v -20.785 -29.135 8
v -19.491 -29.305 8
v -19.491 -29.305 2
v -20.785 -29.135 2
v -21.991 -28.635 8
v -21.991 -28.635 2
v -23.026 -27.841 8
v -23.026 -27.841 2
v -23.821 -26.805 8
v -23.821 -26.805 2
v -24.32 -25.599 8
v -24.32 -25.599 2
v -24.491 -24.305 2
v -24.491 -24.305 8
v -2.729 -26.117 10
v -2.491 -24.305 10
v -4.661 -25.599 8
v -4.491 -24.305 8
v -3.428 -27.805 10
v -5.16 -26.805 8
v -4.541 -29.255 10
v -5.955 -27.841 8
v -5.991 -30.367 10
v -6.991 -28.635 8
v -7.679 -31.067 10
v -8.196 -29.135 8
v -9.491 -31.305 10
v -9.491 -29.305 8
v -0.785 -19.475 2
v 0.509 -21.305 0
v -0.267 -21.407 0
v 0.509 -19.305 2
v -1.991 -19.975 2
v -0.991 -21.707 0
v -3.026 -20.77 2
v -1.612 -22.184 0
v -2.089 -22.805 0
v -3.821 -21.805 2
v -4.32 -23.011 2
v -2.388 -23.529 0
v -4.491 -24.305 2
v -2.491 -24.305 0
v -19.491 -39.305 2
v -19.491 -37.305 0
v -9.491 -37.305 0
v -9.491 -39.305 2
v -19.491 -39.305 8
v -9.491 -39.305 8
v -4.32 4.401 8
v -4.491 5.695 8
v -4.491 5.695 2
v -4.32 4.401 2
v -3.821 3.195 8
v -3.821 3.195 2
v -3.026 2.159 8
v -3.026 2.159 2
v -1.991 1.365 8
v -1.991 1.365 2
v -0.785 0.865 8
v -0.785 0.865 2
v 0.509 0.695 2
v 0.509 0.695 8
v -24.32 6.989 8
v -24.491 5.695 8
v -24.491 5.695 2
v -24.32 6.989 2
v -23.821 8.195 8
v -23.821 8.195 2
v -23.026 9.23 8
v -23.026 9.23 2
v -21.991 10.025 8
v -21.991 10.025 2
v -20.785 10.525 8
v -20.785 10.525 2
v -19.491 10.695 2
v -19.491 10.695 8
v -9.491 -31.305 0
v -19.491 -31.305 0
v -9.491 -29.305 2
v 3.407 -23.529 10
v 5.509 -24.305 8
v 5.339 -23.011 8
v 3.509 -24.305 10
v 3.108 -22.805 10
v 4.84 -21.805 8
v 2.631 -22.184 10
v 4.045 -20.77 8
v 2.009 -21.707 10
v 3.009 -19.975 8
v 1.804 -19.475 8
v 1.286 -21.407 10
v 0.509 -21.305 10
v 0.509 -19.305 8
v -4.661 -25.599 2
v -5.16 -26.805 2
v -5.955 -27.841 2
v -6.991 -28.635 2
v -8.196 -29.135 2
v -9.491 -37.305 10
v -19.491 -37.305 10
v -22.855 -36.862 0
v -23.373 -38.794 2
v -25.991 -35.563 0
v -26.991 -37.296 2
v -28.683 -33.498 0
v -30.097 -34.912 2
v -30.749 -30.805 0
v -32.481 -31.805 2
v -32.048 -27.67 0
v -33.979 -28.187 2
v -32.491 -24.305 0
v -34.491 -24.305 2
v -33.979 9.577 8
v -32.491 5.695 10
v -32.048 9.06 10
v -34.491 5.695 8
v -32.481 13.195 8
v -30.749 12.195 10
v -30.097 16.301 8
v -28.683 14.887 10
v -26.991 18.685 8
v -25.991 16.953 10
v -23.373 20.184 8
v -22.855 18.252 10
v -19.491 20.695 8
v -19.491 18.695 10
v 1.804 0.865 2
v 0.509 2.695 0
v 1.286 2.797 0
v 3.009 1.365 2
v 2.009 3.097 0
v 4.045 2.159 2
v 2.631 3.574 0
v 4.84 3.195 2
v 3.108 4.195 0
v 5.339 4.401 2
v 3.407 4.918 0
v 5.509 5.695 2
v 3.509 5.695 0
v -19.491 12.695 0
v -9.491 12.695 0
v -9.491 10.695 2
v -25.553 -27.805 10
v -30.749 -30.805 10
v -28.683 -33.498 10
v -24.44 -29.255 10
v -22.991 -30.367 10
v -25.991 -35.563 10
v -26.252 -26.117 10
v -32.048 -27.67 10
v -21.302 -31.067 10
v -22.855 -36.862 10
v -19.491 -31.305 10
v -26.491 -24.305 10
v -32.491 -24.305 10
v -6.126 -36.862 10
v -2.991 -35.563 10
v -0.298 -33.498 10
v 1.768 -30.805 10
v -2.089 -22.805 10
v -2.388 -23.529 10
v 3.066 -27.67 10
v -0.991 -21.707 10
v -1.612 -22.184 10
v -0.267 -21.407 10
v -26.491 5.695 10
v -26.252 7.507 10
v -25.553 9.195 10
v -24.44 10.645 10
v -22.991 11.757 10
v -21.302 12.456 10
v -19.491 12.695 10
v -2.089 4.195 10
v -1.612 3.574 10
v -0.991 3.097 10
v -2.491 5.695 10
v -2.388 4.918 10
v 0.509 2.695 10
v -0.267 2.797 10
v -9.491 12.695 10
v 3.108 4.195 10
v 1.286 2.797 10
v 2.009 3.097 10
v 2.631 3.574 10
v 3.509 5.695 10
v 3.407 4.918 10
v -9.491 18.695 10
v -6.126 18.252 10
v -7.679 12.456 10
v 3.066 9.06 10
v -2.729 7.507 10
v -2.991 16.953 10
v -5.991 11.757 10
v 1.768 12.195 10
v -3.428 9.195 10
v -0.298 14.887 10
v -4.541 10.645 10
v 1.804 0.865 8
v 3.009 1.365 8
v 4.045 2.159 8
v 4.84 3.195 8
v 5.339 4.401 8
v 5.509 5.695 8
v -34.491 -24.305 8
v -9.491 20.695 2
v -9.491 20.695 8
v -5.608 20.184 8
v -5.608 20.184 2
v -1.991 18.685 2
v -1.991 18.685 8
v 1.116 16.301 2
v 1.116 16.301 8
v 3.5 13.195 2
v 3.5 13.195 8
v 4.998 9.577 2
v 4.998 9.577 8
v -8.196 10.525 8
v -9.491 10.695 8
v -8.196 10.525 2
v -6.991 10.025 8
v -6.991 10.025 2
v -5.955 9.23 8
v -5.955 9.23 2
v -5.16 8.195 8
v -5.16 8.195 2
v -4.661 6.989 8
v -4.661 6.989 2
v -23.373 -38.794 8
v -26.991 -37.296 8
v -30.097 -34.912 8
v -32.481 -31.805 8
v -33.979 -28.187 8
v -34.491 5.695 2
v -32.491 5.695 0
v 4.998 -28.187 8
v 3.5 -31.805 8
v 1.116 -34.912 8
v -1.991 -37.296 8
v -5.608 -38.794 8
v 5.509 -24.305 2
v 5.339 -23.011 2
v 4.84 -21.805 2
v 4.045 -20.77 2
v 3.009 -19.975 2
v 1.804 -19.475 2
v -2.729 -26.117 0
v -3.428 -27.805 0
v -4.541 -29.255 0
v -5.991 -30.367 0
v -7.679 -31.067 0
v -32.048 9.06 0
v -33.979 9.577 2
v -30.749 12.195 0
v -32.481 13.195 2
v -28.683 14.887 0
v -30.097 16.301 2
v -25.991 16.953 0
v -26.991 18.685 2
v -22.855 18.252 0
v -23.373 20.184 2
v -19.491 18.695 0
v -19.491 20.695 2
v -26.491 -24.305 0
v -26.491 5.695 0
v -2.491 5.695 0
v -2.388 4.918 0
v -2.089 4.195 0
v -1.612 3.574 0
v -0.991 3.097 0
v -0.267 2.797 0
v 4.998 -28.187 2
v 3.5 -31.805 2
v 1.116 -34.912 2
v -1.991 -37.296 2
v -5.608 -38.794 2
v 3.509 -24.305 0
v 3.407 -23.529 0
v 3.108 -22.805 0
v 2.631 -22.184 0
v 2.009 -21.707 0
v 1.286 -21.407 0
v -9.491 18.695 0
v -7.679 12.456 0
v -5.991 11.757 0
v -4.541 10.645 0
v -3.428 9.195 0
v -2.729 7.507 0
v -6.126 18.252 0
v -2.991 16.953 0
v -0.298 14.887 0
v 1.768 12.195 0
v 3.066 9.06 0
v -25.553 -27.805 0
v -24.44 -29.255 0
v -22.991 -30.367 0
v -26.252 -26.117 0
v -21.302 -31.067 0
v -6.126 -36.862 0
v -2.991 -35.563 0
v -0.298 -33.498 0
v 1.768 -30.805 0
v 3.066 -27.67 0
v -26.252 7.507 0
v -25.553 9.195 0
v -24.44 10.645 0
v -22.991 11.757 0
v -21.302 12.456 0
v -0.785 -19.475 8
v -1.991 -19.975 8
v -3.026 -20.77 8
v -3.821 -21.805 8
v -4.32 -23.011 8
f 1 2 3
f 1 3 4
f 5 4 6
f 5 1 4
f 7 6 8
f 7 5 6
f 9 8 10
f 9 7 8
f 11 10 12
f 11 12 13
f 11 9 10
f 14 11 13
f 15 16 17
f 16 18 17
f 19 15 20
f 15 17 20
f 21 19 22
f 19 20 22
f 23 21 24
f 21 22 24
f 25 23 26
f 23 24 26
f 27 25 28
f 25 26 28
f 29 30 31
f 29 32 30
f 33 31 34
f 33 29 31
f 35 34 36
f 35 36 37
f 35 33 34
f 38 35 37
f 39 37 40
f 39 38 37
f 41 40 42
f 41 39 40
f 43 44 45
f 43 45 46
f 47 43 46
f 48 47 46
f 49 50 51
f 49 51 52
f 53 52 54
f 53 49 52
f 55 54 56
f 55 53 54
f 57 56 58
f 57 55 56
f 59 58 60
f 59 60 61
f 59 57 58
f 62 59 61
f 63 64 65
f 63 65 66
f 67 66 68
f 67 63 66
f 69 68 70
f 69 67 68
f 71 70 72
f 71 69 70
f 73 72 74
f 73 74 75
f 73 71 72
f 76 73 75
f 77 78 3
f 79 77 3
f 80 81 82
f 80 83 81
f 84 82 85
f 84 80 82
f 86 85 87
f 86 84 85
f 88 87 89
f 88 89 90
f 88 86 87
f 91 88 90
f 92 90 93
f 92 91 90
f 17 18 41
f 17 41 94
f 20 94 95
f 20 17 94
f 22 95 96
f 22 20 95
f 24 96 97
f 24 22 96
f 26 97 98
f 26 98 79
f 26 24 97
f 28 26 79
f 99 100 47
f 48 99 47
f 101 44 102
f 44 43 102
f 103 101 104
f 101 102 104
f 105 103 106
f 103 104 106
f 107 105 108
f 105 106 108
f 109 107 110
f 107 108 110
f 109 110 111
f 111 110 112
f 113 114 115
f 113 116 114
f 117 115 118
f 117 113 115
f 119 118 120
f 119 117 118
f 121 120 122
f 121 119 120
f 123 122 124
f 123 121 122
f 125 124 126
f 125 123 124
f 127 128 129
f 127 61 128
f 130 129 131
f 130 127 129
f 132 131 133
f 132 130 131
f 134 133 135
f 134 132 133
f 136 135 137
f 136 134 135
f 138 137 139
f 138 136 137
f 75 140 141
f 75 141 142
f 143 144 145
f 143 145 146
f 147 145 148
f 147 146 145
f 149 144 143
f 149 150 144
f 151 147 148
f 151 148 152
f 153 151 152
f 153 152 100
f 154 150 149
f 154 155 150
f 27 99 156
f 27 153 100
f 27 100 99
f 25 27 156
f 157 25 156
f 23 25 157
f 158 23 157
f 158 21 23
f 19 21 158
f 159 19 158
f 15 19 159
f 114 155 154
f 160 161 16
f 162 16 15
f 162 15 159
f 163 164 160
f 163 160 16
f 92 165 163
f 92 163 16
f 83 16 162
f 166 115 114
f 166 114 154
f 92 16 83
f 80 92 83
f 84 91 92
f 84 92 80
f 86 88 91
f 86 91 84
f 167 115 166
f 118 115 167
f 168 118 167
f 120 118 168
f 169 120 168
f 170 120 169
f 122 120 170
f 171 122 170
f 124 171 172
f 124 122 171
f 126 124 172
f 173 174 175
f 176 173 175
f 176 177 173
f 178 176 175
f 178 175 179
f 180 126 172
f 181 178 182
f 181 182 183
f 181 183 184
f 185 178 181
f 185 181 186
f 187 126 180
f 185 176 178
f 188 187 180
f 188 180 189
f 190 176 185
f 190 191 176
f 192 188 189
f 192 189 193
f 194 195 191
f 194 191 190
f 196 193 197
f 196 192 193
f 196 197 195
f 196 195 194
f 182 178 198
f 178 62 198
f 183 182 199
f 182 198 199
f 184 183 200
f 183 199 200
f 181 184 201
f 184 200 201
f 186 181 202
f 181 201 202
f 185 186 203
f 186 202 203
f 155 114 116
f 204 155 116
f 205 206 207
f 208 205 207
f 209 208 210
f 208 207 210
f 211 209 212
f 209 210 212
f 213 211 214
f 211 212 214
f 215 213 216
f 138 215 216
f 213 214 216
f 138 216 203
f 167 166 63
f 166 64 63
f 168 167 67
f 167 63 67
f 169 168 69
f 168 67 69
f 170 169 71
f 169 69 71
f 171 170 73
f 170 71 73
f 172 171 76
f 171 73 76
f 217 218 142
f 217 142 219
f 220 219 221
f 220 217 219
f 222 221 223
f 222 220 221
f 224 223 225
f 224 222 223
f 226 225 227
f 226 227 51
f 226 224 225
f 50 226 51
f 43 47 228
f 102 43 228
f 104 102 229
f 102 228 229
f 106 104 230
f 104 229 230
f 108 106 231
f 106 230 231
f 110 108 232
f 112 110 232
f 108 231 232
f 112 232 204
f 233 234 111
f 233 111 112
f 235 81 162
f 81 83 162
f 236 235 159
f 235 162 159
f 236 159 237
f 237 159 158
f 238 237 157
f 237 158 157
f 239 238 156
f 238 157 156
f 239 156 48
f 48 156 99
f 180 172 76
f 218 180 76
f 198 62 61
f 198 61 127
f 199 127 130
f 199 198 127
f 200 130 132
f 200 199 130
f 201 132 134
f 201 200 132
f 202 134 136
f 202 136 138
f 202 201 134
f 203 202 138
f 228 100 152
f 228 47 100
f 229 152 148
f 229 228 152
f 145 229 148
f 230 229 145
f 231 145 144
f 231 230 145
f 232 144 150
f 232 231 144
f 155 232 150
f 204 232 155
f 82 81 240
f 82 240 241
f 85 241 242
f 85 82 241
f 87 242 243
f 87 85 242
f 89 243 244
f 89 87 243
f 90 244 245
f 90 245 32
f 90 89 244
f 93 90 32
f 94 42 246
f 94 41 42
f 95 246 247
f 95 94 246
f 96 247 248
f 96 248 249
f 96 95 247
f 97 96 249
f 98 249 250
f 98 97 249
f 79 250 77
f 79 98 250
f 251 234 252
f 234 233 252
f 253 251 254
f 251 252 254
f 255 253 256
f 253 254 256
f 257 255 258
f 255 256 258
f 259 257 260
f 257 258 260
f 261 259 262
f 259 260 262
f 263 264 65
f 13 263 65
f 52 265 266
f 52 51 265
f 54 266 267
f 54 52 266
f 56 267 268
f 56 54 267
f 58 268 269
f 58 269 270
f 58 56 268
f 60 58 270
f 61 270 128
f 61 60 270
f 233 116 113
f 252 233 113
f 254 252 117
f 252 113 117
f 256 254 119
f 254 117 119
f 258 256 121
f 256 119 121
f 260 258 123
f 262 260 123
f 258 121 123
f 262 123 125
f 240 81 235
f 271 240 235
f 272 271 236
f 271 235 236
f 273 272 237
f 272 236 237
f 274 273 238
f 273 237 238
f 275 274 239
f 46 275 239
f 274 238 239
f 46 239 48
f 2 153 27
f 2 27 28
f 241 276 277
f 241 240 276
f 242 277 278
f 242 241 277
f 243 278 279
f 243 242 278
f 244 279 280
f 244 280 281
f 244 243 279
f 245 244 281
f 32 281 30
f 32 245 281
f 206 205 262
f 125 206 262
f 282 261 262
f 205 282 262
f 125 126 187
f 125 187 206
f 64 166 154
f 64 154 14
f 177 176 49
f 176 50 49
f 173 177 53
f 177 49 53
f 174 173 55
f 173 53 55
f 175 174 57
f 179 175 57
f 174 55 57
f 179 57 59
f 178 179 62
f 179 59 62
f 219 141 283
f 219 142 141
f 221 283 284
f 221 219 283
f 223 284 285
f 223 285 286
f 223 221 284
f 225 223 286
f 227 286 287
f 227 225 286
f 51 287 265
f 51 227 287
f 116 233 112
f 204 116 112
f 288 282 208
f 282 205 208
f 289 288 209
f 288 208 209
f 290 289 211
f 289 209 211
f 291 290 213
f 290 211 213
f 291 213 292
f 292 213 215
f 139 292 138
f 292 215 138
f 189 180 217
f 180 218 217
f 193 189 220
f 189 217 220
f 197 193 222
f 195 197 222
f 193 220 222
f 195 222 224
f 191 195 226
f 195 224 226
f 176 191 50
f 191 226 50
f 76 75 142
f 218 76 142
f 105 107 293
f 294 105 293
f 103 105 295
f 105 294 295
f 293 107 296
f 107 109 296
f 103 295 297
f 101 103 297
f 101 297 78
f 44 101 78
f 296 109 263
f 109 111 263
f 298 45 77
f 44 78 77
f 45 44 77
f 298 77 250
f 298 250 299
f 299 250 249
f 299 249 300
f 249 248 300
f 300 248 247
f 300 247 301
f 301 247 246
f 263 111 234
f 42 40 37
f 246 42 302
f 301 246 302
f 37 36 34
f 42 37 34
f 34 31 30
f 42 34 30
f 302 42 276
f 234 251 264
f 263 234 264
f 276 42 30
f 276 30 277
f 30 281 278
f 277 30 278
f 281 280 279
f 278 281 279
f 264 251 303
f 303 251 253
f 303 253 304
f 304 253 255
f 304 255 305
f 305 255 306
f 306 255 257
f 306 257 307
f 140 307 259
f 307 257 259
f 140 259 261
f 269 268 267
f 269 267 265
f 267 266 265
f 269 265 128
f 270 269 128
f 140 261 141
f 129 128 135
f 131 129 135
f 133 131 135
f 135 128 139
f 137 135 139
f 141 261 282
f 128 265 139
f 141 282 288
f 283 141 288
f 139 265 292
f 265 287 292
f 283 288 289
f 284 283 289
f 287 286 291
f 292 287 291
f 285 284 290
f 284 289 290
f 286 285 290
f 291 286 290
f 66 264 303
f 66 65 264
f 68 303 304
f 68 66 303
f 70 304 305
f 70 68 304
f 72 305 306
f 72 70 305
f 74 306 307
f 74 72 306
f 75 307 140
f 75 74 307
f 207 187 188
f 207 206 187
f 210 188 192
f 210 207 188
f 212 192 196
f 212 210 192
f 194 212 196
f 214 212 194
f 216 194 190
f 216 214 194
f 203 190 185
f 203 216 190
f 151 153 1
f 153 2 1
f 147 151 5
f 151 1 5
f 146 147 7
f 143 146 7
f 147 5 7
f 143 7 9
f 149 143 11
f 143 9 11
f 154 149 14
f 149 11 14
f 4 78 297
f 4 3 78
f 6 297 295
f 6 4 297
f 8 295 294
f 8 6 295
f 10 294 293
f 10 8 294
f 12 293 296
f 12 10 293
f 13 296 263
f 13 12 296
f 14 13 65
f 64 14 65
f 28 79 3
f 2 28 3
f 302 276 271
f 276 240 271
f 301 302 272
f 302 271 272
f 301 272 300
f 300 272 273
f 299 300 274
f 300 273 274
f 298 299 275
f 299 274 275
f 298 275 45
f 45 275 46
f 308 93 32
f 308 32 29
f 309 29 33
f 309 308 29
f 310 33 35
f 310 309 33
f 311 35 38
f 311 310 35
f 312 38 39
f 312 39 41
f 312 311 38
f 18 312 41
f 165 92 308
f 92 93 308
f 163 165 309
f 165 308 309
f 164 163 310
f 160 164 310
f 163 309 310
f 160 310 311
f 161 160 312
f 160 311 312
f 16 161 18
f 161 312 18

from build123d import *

# Parameters (mm, degrees)
F0_W         = 10
F0_H         = 10
F1_DEPTH     = 10
F2_R         = 4.99999
F3_R         = 15
F4_T1_DEPTH  = 30
F4_T3_DEPTH  = 10
F4_T5_DEPTH  = 1e-05
F4_T7_DEPTH  = 2e-05
F4_T9_DEPTH  = 2e-05
F4_T11_DEPTH = 10.00002
F4_T13_DEPTH = 30.00002
F4_T15_DEPTH = 2e-05
F4_T17_DEPTH = 1e-05
F4_T20_ANGLE = 90
F4_T22_ANGLE = 90
F4_T24_ANGLE = 90
F4_T26_ANGLE = 90
F4_T28_ANGLE = 90
F4_T30_ANGLE = 90
F4_T32_ANGLE = 90
F4_T34_ANGLE = 90
F4_T36_ANGLE = 90
F4_T38_ANGLE = 90
F4_T40_ANGLE = 90
F4_T42_ANGLE = 90
F4_T44_ANGLE = 90
F4_T46_ANGLE = 90
F4_T48_ANGLE = 90
F4_T50_ANGLE = 90
F4_T52_ANGLE = 90
F4_T54_ANGLE = 90
F4_T56_ANGLE = 90
F4_T58_ANGLE = 90
F4_T60_ANGLE = 90
F4_T62_ANGLE = 90
F4_T64_ANGLE = 90
F4_T66_ANGLE = 90


# Not quite as in the source:
# - a fillet or chamfer that OpenCascade refuses, or shapes differently, is made with other operations: its cross-section is extruded or revolved along the edge and cut away or added
# - a fillet or chamfer is up to 0.001 mm smaller than in the source, because OpenCascade refuses the exact size


with BuildPart() as f1:
    # F0 (on Top) → F1 (new body)
    with BuildSketch(Plane.XY):
        Polygon((-4.4905686265, 20.6948744461), (-34.4905686265, 20.6948744461), (-34.4905686265, 10.6948744461), (-24.4905686265, 10.6948744461), (-4.4905686265, 10.6948744461), align=None)
        Polygon((5.5094313735, 20.6948744461), (-4.4905686265, 20.6948744461), (-4.4905686265, 10.6948744461), (-4.4905686265, 0.6948744461), (5.5094313735, 0.6948744461), align=None)
        with Locations((0.5094313735, -24.3051255539)):
            Rectangle(F0_W, F0_H)
        Polygon((-24.4905686265, 10.6948744461), (-34.4905686265, 10.6948744461), (-34.4905686265, -39.3051255539), (-24.4905686265, -39.3051255539), (-24.4905686265, -29.3051255539), align=None)
        Polygon((-4.4905686265, -29.3051255539), (-24.4905686265, -29.3051255539), (-24.4905686265, -39.3051255539), (5.5094313735, -39.3051255539), (5.5094313735, -29.3051255539), align=None)
    extrude(amount=F1_DEPTH)

    # F2 (radius 5 in the source; OpenCascade refuses exactly that, so slightly less here)
    f2_edges = [f1.edges().sort_by_distance(p)[0] for p in [
        (5.509431, 0.694874, 5),
        (-4.490569, 0.694874, 5),
        (-4.490569, 10.694874, 5),
        (5.509431, -19.305126, 5),
        (-4.490569, -19.305126, 5),
        (-24.490569, 10.694874, 5),
        (-24.490569, -29.305126, 5),
        (-4.490569, -29.305126, 5),
    ]]
    fillet(f2_edges, radius=F2_R)

    # F3
    f3_edges = [f1.edges().sort_by_distance(p)[0] for p in [
        (-34.490569, 20.694874, 5),
        (5.509431, 20.694874, 5),
        (5.509431, -39.305126, 5),
        (-34.490569, -39.305126, 5),
    ]]
    fillet(f3_edges, radius=F3_R)

    # F4: chamfer of 2 on 2 edges, made by hand

    # F4_s2 → F4_t1 (cut)
    with BuildSketch(Plane.XZ.offset(-5.6948744461)):
        Polygon((-32.4905686265, 10), (-34.4905686265, 8), (-34.4905686265, 10), align=None)
        Polygon((-32.4905686265, 0), (-34.4905686265, 2), (-34.4905686265, 0), align=None)
    extrude(amount=F4_T1_DEPTH, mode=Mode.SUBTRACT)

    # F4_s4 → F4_t3 (cut)
    with BuildSketch(Plane.YZ.offset(-19.4905686265)):
        Polygon((-37.3051255539, 0), (-39.3051255539, 2), (-39.3051255539, 0), align=None)
        Polygon((18.6948744461, 0), (20.6948744461, 2), (20.6948744461, 0), align=None)
        Polygon((-37.3051255539, 10), (-39.3051255539, 8), (-39.3051255539, 10), align=None)
        Polygon((18.6948744461, 10), (20.6948744461, 8), (20.6948744461, 10), align=None)
    extrude(amount=F4_T3_DEPTH, mode=Mode.SUBTRACT)

    # F4_s6 → F4_t5 (cut)
    with BuildSketch(Plane.XZ.offset(24.3051155539)):
        Polygon((5.5094313735, 2), (3.5094313735, 0), (5.5094313735, 0), align=None)
        Polygon((5.5094313735, 8), (3.5094313735, 10), (5.5094313735, 10), align=None)
    extrude(amount=F4_T5_DEPTH, mode=Mode.SUBTRACT)

    # F4_s8 → F4_t7 (cut)
    with BuildSketch(Plane.YZ.offset(0.5094213735)):
        Polygon((-21.3051255539, 0), (-19.3051255539, 2), (-19.3051255539, 0), align=None)
        Polygon((2.6948744461, 0), (0.6948744461, 2), (0.6948744461, 0), align=None)
        Polygon((-21.3051255539, 10), (-19.3051255539, 8), (-19.3051255539, 10), align=None)
        Polygon((2.6948744461, 10), (0.6948744461, 8), (0.6948744461, 10), align=None)
    extrude(amount=F4_T7_DEPTH, mode=Mode.SUBTRACT)

    # F4_s10 → F4_t9 (cut)
    with BuildSketch(Plane.XZ.offset(24.3051155539)):
        Polygon((-2.4905686265, 0), (-4.4905686265, 2), (-4.4905686265, 0), align=None)
        Polygon((-2.4905686265, 10), (-4.4905686265, 8), (-4.4905686265, 10), align=None)
    extrude(amount=F4_T9_DEPTH, mode=Mode.SUBTRACT)

    # F4_s12 → F4_t11 (cut)
    with BuildSketch(Plane.YZ.offset(-19.4905786265)):
        Polygon((-31.3051255539, 0), (-29.3051255539, 2), (-29.3051255539, 0), align=None)
        Polygon((12.6948744461, 0), (10.6948744461, 2), (10.6948744461, 0), align=None)
        Polygon((-31.3051255539, 10), (-29.3051255539, 8), (-29.3051255539, 10), align=None)
        Polygon((12.6948744461, 10), (10.6948744461, 8), (10.6948744461, 10), align=None)
    extrude(amount=F4_T11_DEPTH, mode=Mode.SUBTRACT)

    # F4_s14 → F4_t13 (cut)
    with BuildSketch(Plane.XZ.offset(-5.6948844461)):
        Polygon((-26.4905686265, 0), (-24.4905686265, 2), (-24.4905686265, 0), align=None)
        Polygon((-26.4905686265, 10), (-24.4905686265, 8), (-24.4905686265, 10), align=None)
    extrude(amount=F4_T13_DEPTH, mode=Mode.SUBTRACT)

    # F4_s16 → F4_t15 (cut)
    with BuildSketch(Plane.XZ.offset(-5.6948844461)):
        Polygon((-2.4905686265, 0), (-4.4905686265, 2), (-4.4905686265, 0), align=None)
        Polygon((-2.4905686265, 10), (-4.4905686265, 8), (-4.4905686265, 10), align=None)
    extrude(amount=F4_T15_DEPTH, mode=Mode.SUBTRACT)

    # F4_s18 → F4_t17 (cut)
    with BuildSketch(Plane.XZ.offset(-5.6948744461)):
        Polygon((3.5094313735, 0), (5.5094313735, 2), (5.5094313735, 0), align=None)
        Polygon((3.5094313735, 10), (5.5094313735, 8), (5.5094313735, 10), align=None)
    extrude(amount=F4_T17_DEPTH, mode=Mode.SUBTRACT)

    # F4_s19 → F4_t20 (revolve, cut)
    with BuildSketch(Plane.XZ.offset(-5.6948744461)):
        Polygon((-32.4905686265, 0), (-34.4905686265, 2), (-34.4905686265, 0), align=None)
    revolve(axis=Axis((-19.4905686265, 5.6948744461, 0), (0, 0, -1)), revolution_arc=F4_T20_ANGLE, mode=Mode.SUBTRACT)

    # F4_s21 → F4_t22 (revolve, cut)
    with BuildSketch(Plane.YZ.offset(-19.4905686265)):
        Polygon((-37.3051255539, 0), (-39.3051255539, 2), (-39.3051255539, 0), align=None)
    revolve(axis=Axis((-19.4905686265, -24.3051255539, 0), (0, 0, -1)), revolution_arc=F4_T22_ANGLE, mode=Mode.SUBTRACT)

    # F4_s23 → F4_t24 (revolve, cut)
    with BuildSketch(Plane.XZ.offset(24.3051255539)):
        Polygon((3.5094313735, 0), (5.5094313735, 2), (5.5094313735, 0), align=None)
    revolve(axis=Axis((-9.4905686265, -24.3051255539, 0), (0, 0, -1)), revolution_arc=F4_T24_ANGLE, mode=Mode.SUBTRACT)

    # F4_s25 → F4_t26 (revolve, cut)
    with BuildSketch(Plane.XZ.offset(24.3051155539)):
        Polygon((3.5094313735, 0), (5.5094313735, 2), (5.5094313735, 0), align=None)
    revolve(axis=Axis((0.5094413735, -24.3051155539, 0), (0, 0, 1)), revolution_arc=F4_T26_ANGLE, mode=Mode.SUBTRACT)

    # F4_s27 → F4_t28 (revolve, cut)
    with BuildSketch(Plane.YZ.offset(0.5094213735)):
        Polygon((-21.3051255539, 0), (-19.3051255539, 2), (-19.3051255539, 0), align=None)
    revolve(axis=Axis((0.5094213735, -24.3051155539, 0), (0, 0, 1)), revolution_arc=F4_T28_ANGLE, mode=Mode.SUBTRACT)

    # F4_s29 → F4_t30 (revolve, cut)
    with BuildSketch(Plane.XZ.offset(24.3051355539)):
        Polygon((-2.4905686265, 0), (-4.4905686265, 2), (-4.4905686265, 0), align=None)
    revolve(axis=Axis((-9.4905586265, -24.3051355539, 0), (0, 0, -1)), revolution_arc=F4_T30_ANGLE, mode=Mode.SUBTRACT)

    # F4_s31 → F4_t32 (revolve, cut)
    with BuildSketch(Plane.YZ.offset(-19.4905786265)):
        Polygon((-31.3051255539, 0), (-29.3051255539, 2), (-29.3051255539, 0), align=None)
    revolve(axis=Axis((-19.4905786265, -24.3051355539, 0), (0, 0, -1)), revolution_arc=F4_T32_ANGLE, mode=Mode.SUBTRACT)

    # F4_s33 → F4_t34 (revolve, cut)
    with BuildSketch(Plane.XZ.offset(-5.6948844461)):
        Polygon((-26.4905686265, 0), (-24.4905686265, 2), (-24.4905686265, 0), align=None)
    revolve(axis=Axis((-19.4905786265, 5.6948844461, 0), (0, 0, -1)), revolution_arc=F4_T34_ANGLE, mode=Mode.SUBTRACT)

    # F4_s35 → F4_t36 (revolve, cut)
    with BuildSketch(Plane.YZ.offset(-9.4905586265)):
        Polygon((12.6948744461, 0), (10.6948744461, 2), (10.6948744461, 0), align=None)
    revolve(axis=Axis((-9.4905586265, 5.6948844461, 0), (0, 0, -1)), revolution_arc=F4_T36_ANGLE, mode=Mode.SUBTRACT)

    # F4_s37 → F4_t38 (revolve, cut)
    with BuildSketch(Plane.XZ.offset(-5.6948644461)):
        Polygon((-2.4905686265, 0), (-4.4905686265, 2), (-4.4905686265, 0), align=None)
    revolve(axis=Axis((0.5094213735, 5.6948644461, 0), (0, 0, 1)), revolution_arc=F4_T38_ANGLE, mode=Mode.SUBTRACT)

    # F4_s39 → F4_t40 (revolve, cut)
    with BuildSketch(Plane.YZ.offset(0.5094413735)):
        Polygon((2.6948744461, 0), (0.6948744461, 2), (0.6948744461, 0), align=None)
    revolve(axis=Axis((0.5094413735, 5.6948644461, 0), (0, 0, 1)), revolution_arc=F4_T40_ANGLE, mode=Mode.SUBTRACT)

    # F4_s41 → F4_t42 (revolve, cut)
    with BuildSketch(Plane.YZ.offset(-9.4905686265)):
        Polygon((18.6948744461, 0), (20.6948744461, 2), (20.6948744461, 0), align=None)
    revolve(axis=Axis((-9.4905686265, 5.6948744461, 0), (0, 0, -1)), revolution_arc=F4_T42_ANGLE, mode=Mode.SUBTRACT)

    # F4_s43 → F4_t44 (revolve, cut)
    with BuildSketch(Plane.XZ.offset(-5.6948744461)):
        Polygon((-32.4905686265, 10), (-34.4905686265, 8), (-34.4905686265, 10), align=None)
    revolve(axis=Axis((-19.4905686265, 5.6948744461, 10), (0, 0, -1)), revolution_arc=F4_T44_ANGLE, mode=Mode.SUBTRACT)

    # F4_s45 → F4_t46 (revolve, cut)
    with BuildSketch(Plane.YZ.offset(-19.4905686265)):
        Polygon((-37.3051255539, 10), (-39.3051255539, 8), (-39.3051255539, 10), align=None)
    revolve(axis=Axis((-19.4905686265, -24.3051255539, 10), (0, 0, -1)), revolution_arc=F4_T46_ANGLE, mode=Mode.SUBTRACT)

    # F4_s47 → F4_t48 (revolve, cut)
    with BuildSketch(Plane.XZ.offset(24.3051255539)):
        Polygon((5.5094313735, 8), (3.5094313735, 10), (5.5094313735, 10), align=None)
    revolve(axis=Axis((-9.4905686265, -24.3051255539, 10), (0, 0, -1)), revolution_arc=F4_T48_ANGLE, mode=Mode.SUBTRACT)

    # F4_s49 → F4_t50 (revolve, cut)
    with BuildSketch(Plane.XZ.offset(24.3051155539)):
        Polygon((5.5094313735, 8), (3.5094313735, 10), (5.5094313735, 10), align=None)
    revolve(axis=Axis((0.5094413735, -24.3051155539, 10), (0, 0, 1)), revolution_arc=F4_T50_ANGLE, mode=Mode.SUBTRACT)

    # F4_s51 → F4_t52 (revolve, cut)
    with BuildSketch(Plane.YZ.offset(0.5094213735)):
        Polygon((-21.3051255539, 10), (-19.3051255539, 8), (-19.3051255539, 10), align=None)
    revolve(axis=Axis((0.5094213735, -24.3051155539, 10), (0, 0, 1)), revolution_arc=F4_T52_ANGLE, mode=Mode.SUBTRACT)

    # F4_s53 → F4_t54 (revolve, cut)
    with BuildSketch(Plane.XZ.offset(24.3051355539)):
        Polygon((-2.4905686265, 10), (-4.4905686265, 8), (-4.4905686265, 10), align=None)
    revolve(axis=Axis((-9.4905586265, -24.3051355539, 10), (0, 0, -1)), revolution_arc=F4_T54_ANGLE, mode=Mode.SUBTRACT)

    # F4_s55 → F4_t56 (revolve, cut)
    with BuildSketch(Plane.YZ.offset(-19.4905786265)):
        Polygon((-31.3051255539, 10), (-29.3051255539, 8), (-29.3051255539, 10), align=None)
    revolve(axis=Axis((-19.4905786265, -24.3051355539, 10), (0, 0, -1)), revolution_arc=F4_T56_ANGLE, mode=Mode.SUBTRACT)

    # F4_s57 → F4_t58 (revolve, cut)
    with BuildSketch(Plane.XZ.offset(-5.6948844461)):
        Polygon((-26.4905686265, 10), (-24.4905686265, 8), (-24.4905686265, 10), align=None)
    revolve(axis=Axis((-19.4905786265, 5.6948844461, 10), (0, 0, -1)), revolution_arc=F4_T58_ANGLE, mode=Mode.SUBTRACT)

    # F4_s59 → F4_t60 (revolve, cut)
    with BuildSketch(Plane.YZ.offset(-9.4905586265)):
        Polygon((12.6948744461, 10), (10.6948744461, 8), (10.6948744461, 10), align=None)
    revolve(axis=Axis((-9.4905586265, 5.6948844461, 10), (0, 0, -1)), revolution_arc=F4_T60_ANGLE, mode=Mode.SUBTRACT)

    # F4_s61 → F4_t62 (revolve, cut)
    with BuildSketch(Plane.XZ.offset(-5.6948644461)):
        Polygon((-2.4905686265, 10), (-4.4905686265, 8), (-4.4905686265, 10), align=None)
    revolve(axis=Axis((0.5094213735, 5.6948644461, 10), (0, 0, 1)), revolution_arc=F4_T62_ANGLE, mode=Mode.SUBTRACT)

    # F4_s63 → F4_t64 (revolve, cut)
    with BuildSketch(Plane.YZ.offset(0.5094413735)):
        Polygon((2.6948744461, 10), (0.6948744461, 8), (0.6948744461, 10), align=None)
    revolve(axis=Axis((0.5094413735, 5.6948644461, 10), (0, 0, 1)), revolution_arc=F4_T64_ANGLE, mode=Mode.SUBTRACT)

    # F4_s65 → F4_t66 (revolve, cut)
    with BuildSketch(Plane.YZ.offset(-9.4905686265)):
        Polygon((18.6948744461, 10), (20.6948744461, 8), (20.6948744461, 10), align=None)
    revolve(axis=Axis((-9.4905686265, 5.6948744461, 10), (0, 0, -1)), revolution_arc=F4_T66_ANGLE, mode=Mode.SUBTRACT)


solid = f1.part
